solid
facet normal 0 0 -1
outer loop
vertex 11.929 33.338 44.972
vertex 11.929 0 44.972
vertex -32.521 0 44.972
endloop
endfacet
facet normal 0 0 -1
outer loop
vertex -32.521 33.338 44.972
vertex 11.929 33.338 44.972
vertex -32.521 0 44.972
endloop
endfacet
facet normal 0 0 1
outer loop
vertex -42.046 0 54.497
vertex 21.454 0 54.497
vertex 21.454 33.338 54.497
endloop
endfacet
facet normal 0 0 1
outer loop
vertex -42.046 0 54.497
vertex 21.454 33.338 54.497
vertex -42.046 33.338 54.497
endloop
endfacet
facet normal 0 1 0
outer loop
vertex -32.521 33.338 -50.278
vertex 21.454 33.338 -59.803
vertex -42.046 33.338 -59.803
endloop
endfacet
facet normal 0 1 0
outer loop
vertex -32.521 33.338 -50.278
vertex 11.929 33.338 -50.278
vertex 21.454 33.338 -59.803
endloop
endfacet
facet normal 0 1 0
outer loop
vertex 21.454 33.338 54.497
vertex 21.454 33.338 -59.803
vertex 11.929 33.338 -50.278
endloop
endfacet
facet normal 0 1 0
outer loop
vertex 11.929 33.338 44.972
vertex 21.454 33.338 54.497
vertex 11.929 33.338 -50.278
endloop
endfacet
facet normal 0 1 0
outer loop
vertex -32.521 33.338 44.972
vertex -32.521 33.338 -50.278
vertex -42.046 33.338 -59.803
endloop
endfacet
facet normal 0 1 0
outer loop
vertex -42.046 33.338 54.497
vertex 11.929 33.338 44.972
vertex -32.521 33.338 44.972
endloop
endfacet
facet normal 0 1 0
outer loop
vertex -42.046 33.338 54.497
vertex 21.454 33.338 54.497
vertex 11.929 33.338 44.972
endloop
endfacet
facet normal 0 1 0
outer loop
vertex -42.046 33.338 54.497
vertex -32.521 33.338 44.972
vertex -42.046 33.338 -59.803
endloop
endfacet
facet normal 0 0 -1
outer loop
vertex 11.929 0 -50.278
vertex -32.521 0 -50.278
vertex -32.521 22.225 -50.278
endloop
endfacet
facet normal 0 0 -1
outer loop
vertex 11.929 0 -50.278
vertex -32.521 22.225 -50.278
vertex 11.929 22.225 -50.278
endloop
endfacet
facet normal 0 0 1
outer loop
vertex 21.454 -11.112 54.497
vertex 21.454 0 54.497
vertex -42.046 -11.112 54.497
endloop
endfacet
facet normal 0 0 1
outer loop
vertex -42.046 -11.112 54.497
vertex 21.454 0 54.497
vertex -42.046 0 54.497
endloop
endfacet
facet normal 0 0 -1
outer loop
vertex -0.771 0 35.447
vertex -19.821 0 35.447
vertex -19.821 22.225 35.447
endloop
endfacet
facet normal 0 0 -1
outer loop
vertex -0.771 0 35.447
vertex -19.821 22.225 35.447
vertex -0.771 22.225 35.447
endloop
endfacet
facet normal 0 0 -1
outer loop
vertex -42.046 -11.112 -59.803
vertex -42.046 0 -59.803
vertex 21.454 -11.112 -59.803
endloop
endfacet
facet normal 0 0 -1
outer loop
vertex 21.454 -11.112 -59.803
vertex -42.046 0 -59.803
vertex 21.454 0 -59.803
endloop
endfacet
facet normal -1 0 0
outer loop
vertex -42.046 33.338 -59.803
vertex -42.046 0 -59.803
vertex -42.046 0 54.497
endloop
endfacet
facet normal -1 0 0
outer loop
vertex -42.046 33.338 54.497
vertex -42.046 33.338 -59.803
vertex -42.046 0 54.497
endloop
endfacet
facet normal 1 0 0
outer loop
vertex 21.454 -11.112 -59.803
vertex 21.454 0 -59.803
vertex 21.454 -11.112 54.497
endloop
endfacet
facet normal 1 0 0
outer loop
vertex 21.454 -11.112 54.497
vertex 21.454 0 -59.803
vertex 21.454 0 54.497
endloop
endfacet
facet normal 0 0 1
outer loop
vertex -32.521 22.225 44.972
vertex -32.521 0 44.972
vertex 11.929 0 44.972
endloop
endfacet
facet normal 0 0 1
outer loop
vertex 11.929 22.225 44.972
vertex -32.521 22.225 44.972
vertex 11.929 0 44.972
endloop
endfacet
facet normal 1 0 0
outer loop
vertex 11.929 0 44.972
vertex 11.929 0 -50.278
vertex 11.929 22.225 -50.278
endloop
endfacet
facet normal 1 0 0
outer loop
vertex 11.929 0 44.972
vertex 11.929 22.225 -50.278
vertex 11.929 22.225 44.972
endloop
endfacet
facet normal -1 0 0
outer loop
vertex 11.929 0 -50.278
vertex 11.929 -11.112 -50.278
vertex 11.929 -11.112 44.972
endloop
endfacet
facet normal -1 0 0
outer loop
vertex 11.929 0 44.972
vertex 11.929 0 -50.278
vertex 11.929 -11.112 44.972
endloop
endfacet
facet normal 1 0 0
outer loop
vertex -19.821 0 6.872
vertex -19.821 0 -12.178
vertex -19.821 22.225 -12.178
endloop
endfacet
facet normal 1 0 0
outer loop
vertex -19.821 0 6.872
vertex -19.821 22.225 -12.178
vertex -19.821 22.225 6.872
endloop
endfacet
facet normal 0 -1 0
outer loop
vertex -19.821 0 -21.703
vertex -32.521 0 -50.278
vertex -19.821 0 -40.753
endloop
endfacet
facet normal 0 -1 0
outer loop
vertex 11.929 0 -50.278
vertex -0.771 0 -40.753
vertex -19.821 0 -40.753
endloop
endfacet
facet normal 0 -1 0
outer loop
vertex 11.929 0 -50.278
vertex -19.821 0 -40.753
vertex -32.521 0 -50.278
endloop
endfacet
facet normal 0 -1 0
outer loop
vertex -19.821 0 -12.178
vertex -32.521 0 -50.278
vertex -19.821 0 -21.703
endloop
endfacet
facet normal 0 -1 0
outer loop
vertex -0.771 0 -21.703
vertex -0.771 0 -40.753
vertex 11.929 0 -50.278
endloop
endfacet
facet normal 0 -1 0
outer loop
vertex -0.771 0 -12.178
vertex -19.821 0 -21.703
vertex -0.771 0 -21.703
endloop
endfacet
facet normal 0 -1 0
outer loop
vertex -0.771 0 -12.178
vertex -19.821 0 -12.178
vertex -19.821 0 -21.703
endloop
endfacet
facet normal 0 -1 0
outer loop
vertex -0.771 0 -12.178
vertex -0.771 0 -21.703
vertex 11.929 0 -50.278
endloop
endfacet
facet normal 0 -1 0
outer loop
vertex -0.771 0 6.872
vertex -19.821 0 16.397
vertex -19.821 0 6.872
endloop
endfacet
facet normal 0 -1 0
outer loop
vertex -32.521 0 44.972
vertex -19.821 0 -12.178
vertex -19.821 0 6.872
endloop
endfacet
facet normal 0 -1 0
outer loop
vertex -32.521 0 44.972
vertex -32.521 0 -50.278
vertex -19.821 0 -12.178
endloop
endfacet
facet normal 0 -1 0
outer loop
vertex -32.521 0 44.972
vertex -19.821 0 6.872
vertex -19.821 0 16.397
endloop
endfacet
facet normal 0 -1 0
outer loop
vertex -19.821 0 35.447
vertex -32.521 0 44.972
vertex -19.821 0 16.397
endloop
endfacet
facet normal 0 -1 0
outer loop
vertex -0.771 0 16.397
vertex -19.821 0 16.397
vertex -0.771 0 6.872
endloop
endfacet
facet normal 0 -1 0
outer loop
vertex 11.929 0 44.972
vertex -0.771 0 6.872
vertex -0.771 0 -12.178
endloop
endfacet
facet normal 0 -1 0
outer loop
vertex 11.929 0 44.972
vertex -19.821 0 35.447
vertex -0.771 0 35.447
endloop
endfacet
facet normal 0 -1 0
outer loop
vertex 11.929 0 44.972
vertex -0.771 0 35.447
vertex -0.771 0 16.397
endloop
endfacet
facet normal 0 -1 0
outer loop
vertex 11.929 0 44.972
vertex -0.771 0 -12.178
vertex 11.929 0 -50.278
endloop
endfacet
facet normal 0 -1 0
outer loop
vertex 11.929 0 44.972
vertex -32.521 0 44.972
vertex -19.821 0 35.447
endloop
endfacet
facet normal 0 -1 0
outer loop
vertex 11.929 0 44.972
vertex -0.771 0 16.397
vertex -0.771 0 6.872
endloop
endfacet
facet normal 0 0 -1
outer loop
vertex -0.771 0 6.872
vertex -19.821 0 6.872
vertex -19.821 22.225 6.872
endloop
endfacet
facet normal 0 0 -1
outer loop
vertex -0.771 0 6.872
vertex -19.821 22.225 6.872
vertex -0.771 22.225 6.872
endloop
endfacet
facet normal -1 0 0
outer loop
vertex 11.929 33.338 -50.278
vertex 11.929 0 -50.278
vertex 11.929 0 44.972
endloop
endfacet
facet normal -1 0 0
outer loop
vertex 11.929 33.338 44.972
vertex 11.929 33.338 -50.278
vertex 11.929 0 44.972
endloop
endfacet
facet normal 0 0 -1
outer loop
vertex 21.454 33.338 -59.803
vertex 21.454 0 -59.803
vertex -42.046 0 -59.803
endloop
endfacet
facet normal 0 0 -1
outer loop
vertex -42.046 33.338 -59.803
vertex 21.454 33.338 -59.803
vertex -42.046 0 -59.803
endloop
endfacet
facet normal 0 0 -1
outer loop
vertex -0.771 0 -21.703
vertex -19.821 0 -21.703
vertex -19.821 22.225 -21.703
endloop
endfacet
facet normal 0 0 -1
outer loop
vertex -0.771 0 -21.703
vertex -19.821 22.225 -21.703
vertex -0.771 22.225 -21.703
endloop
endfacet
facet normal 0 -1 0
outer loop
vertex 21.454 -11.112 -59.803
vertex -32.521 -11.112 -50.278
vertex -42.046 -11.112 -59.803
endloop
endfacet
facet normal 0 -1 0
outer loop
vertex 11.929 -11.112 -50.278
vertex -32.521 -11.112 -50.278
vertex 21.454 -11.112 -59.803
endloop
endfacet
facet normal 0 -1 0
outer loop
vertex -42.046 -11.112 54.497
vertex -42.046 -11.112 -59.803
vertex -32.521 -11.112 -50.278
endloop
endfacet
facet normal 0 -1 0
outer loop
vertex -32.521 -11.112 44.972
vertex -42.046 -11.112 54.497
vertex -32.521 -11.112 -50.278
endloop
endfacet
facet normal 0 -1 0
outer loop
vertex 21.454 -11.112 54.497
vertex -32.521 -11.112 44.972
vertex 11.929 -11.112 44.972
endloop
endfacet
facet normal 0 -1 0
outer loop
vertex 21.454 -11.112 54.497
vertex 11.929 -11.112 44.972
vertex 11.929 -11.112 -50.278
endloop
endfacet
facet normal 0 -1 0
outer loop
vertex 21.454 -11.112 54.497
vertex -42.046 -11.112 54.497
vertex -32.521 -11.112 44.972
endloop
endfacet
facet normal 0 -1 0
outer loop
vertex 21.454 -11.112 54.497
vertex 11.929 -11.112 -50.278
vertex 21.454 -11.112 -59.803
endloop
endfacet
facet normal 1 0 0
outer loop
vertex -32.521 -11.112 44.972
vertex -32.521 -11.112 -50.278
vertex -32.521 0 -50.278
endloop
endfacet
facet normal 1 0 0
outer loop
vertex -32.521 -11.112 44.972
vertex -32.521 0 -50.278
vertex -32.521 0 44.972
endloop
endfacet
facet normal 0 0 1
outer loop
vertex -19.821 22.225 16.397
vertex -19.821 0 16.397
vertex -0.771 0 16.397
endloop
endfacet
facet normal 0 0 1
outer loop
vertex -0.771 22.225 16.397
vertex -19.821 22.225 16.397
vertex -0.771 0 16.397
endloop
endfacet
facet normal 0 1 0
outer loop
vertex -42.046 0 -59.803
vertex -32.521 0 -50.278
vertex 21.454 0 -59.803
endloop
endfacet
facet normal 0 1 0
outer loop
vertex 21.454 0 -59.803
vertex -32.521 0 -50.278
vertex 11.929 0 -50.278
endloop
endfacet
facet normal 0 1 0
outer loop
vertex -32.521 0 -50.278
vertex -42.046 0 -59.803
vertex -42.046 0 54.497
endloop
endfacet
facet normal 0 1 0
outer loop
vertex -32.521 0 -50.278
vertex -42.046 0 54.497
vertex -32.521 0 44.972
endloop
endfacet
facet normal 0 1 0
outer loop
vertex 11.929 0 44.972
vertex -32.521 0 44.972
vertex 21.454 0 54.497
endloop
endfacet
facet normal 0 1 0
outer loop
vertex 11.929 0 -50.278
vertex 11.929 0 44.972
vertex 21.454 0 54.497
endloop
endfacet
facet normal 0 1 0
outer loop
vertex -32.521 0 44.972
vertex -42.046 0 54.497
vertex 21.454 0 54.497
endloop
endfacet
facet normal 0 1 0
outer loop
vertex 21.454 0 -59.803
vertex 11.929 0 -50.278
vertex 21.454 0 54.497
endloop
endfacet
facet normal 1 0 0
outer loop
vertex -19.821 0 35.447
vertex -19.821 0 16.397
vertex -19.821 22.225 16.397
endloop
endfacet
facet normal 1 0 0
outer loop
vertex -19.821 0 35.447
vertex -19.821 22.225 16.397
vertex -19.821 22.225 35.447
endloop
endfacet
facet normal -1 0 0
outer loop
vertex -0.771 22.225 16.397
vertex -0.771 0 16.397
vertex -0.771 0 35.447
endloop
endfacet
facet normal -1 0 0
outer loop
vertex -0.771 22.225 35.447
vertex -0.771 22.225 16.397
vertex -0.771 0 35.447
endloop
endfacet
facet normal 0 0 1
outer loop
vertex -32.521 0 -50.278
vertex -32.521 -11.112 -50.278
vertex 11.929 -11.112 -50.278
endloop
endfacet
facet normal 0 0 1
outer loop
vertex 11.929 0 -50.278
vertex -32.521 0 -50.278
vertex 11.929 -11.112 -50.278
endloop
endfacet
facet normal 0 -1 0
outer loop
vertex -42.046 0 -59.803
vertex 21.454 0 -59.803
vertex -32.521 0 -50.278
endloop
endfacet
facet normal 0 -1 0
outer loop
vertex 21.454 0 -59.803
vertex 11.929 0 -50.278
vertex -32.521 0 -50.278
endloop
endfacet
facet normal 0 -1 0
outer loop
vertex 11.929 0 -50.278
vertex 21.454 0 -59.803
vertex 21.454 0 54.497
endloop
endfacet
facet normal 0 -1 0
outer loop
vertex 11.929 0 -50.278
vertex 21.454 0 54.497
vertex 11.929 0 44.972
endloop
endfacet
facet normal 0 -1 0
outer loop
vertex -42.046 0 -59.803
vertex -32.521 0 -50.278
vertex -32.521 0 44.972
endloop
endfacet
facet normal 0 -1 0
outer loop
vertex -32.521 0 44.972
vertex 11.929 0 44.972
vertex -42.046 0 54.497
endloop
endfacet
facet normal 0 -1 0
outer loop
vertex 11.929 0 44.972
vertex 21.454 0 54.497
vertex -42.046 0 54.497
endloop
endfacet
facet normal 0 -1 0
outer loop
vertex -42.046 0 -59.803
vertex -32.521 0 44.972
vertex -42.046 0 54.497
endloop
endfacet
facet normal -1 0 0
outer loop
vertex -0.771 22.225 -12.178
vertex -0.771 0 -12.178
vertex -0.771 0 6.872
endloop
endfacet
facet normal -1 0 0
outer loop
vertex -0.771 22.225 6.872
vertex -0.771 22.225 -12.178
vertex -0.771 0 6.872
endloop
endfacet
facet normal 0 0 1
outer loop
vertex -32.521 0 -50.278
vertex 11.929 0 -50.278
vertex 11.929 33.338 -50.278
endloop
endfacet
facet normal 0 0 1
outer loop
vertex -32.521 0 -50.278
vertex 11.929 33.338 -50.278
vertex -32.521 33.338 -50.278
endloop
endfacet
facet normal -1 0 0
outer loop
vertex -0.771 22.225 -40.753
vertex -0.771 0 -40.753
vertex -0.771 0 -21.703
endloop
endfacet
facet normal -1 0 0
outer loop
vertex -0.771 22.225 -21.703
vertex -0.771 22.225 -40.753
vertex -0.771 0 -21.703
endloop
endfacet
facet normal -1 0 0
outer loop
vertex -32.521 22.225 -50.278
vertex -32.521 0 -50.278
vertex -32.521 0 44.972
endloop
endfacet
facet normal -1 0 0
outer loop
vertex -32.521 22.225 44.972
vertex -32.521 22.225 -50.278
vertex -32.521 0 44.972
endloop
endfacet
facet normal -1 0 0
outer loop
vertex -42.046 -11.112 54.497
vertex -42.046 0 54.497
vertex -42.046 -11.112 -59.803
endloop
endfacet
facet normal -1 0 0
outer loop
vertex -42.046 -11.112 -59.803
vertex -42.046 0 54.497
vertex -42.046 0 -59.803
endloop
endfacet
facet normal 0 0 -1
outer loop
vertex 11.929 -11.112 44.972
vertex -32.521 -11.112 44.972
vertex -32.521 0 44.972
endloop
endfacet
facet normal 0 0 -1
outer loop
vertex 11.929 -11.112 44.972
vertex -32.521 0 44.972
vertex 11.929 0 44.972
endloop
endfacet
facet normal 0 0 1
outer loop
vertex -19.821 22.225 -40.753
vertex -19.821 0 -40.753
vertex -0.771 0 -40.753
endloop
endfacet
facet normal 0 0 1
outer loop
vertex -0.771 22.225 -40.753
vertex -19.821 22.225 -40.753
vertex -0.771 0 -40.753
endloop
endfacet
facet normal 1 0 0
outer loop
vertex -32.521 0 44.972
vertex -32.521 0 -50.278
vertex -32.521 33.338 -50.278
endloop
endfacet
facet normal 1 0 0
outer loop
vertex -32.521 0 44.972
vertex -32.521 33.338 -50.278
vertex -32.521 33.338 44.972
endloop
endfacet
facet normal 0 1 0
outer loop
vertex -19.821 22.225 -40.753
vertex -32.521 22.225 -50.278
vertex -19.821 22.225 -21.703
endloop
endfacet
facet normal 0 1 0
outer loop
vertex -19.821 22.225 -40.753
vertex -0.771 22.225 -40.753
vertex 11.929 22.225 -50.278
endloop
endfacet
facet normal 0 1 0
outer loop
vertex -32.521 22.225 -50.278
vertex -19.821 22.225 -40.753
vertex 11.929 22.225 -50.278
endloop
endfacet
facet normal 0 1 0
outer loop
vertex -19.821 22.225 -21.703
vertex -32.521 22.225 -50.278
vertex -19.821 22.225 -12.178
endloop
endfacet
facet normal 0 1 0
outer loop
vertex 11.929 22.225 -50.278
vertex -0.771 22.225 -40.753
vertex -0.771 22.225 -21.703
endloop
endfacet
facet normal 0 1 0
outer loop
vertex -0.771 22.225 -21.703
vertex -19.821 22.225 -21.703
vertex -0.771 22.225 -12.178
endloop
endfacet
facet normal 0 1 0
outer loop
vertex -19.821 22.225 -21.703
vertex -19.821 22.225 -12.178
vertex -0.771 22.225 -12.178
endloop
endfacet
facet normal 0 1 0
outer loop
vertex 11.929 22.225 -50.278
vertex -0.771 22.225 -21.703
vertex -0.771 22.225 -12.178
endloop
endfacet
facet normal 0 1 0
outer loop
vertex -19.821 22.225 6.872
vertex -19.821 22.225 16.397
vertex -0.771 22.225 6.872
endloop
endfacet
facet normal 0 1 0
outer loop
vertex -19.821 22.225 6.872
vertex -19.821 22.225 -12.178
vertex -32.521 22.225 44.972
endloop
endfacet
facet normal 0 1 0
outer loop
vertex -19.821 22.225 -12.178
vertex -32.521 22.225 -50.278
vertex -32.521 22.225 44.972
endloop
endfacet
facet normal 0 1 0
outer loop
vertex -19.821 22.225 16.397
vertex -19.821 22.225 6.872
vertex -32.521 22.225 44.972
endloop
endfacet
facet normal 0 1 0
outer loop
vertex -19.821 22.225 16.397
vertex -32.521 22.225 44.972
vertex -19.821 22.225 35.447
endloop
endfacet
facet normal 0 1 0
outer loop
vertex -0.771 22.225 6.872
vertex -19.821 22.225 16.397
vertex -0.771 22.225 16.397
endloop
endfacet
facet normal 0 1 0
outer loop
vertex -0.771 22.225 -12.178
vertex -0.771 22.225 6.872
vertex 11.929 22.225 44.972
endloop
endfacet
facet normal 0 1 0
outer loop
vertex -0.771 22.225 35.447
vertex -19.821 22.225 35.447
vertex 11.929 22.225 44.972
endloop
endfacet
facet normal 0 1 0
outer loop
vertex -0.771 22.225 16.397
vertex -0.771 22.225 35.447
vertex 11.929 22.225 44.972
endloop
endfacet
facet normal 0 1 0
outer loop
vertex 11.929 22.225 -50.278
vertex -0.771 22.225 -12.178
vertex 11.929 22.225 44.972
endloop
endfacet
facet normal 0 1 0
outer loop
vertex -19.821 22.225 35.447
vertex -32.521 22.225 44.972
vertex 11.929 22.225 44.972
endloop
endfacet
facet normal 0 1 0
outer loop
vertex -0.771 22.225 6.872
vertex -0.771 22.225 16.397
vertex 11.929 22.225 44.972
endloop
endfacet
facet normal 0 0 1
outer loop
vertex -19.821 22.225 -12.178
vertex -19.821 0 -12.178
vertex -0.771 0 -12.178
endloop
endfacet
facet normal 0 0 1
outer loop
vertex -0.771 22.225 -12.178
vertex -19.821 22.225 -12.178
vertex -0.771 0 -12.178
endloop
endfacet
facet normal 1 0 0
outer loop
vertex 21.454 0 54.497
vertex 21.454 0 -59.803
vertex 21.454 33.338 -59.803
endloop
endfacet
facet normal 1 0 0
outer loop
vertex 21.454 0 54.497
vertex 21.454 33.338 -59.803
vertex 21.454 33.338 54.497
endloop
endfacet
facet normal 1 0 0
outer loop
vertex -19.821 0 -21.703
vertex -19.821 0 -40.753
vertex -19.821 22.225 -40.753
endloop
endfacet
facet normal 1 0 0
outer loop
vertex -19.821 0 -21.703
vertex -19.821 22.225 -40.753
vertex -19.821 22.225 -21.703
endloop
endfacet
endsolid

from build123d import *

# Parameters (mm, degrees)
F0_W     = 44.45
F0_H     = 95.25
F0_W_2   = 19.05
F0_H_2   = 19.05
F1_DEPTH = 22.225
F3_DEPTH = 11.1125
F4_W     = 44.45
F4_H     = 95.2499976873
F5_DEPTH = 11.1125
F6_W     = 63.5
F6_H     = 114.2999976873
F6_W_2   = 44.45
F6_H_2   = 95.2499976873
F7_DEPTH = 33.3375


with BuildPart() as f1:
    # F0 (on Front) → F1 (new body)
    with BuildSketch(Plane.XZ):
        with Locations((-10.2960738242, -2.6533950508)):
            Rectangle(F0_W, F0_H)
        with Locations((-10.2960738242, -31.2283950508)):
            Rectangle(F0_W_2, F0_H_2, mode=Mode.SUBTRACT)
        with Locations((-10.2960738242, -2.6533950508)):
            Rectangle(F0_W_2, F0_H_2, mode=Mode.SUBTRACT)
        with Locations((-10.2960738242, 25.9216049492)):
            Rectangle(F0_W_2, F0_H_2, mode=Mode.SUBTRACT)
    extrude(amount=-F1_DEPTH)


with BuildPart() as f3:
    # F2 (on face) → F3 (new body)
    with BuildSketch(Plane.XZ):
        Polygon((21.4539261758, -59.8033927381), (21.4539261758, -50.2783950508), (21.4539261758, 44.9716049492), (21.4539261758, 54.4966049492), (-42.0460738242, 54.4966049492), (-42.0460738242, 44.9716049492), (-42.0460738242, -50.2783950508), (-42.0460738242, -59.8033927381), align=None)
    extrude(amount=F3_DEPTH)

    # F4 (on face) → F5 (cut)
    with BuildSketch(Plane.XZ.offset(11.1125)):
        with Locations((-10.2960738242, -2.6533938944)):
            Rectangle(F4_W, F4_H)
    extrude(amount=-F5_DEPTH, mode=Mode.SUBTRACT)


with BuildPart() as f7:
    # F6 (on face) → F7 (new body)
    with BuildSketch(Plane(origin=(0, 0, 0), x_dir=(-1, 0, 0), z_dir=(0, 1, 0))):
        with Locations((10.2960738242, -2.6533938944)):
            Rectangle(F6_W, F6_H)
        with Locations((10.2960738242, -2.6533938944)):
            Rectangle(F6_W_2, F6_H_2, mode=Mode.SUBTRACT)
    extrude(amount=F7_DEPTH)


solid = Compound([f1.part, f3.part, f7.part])
